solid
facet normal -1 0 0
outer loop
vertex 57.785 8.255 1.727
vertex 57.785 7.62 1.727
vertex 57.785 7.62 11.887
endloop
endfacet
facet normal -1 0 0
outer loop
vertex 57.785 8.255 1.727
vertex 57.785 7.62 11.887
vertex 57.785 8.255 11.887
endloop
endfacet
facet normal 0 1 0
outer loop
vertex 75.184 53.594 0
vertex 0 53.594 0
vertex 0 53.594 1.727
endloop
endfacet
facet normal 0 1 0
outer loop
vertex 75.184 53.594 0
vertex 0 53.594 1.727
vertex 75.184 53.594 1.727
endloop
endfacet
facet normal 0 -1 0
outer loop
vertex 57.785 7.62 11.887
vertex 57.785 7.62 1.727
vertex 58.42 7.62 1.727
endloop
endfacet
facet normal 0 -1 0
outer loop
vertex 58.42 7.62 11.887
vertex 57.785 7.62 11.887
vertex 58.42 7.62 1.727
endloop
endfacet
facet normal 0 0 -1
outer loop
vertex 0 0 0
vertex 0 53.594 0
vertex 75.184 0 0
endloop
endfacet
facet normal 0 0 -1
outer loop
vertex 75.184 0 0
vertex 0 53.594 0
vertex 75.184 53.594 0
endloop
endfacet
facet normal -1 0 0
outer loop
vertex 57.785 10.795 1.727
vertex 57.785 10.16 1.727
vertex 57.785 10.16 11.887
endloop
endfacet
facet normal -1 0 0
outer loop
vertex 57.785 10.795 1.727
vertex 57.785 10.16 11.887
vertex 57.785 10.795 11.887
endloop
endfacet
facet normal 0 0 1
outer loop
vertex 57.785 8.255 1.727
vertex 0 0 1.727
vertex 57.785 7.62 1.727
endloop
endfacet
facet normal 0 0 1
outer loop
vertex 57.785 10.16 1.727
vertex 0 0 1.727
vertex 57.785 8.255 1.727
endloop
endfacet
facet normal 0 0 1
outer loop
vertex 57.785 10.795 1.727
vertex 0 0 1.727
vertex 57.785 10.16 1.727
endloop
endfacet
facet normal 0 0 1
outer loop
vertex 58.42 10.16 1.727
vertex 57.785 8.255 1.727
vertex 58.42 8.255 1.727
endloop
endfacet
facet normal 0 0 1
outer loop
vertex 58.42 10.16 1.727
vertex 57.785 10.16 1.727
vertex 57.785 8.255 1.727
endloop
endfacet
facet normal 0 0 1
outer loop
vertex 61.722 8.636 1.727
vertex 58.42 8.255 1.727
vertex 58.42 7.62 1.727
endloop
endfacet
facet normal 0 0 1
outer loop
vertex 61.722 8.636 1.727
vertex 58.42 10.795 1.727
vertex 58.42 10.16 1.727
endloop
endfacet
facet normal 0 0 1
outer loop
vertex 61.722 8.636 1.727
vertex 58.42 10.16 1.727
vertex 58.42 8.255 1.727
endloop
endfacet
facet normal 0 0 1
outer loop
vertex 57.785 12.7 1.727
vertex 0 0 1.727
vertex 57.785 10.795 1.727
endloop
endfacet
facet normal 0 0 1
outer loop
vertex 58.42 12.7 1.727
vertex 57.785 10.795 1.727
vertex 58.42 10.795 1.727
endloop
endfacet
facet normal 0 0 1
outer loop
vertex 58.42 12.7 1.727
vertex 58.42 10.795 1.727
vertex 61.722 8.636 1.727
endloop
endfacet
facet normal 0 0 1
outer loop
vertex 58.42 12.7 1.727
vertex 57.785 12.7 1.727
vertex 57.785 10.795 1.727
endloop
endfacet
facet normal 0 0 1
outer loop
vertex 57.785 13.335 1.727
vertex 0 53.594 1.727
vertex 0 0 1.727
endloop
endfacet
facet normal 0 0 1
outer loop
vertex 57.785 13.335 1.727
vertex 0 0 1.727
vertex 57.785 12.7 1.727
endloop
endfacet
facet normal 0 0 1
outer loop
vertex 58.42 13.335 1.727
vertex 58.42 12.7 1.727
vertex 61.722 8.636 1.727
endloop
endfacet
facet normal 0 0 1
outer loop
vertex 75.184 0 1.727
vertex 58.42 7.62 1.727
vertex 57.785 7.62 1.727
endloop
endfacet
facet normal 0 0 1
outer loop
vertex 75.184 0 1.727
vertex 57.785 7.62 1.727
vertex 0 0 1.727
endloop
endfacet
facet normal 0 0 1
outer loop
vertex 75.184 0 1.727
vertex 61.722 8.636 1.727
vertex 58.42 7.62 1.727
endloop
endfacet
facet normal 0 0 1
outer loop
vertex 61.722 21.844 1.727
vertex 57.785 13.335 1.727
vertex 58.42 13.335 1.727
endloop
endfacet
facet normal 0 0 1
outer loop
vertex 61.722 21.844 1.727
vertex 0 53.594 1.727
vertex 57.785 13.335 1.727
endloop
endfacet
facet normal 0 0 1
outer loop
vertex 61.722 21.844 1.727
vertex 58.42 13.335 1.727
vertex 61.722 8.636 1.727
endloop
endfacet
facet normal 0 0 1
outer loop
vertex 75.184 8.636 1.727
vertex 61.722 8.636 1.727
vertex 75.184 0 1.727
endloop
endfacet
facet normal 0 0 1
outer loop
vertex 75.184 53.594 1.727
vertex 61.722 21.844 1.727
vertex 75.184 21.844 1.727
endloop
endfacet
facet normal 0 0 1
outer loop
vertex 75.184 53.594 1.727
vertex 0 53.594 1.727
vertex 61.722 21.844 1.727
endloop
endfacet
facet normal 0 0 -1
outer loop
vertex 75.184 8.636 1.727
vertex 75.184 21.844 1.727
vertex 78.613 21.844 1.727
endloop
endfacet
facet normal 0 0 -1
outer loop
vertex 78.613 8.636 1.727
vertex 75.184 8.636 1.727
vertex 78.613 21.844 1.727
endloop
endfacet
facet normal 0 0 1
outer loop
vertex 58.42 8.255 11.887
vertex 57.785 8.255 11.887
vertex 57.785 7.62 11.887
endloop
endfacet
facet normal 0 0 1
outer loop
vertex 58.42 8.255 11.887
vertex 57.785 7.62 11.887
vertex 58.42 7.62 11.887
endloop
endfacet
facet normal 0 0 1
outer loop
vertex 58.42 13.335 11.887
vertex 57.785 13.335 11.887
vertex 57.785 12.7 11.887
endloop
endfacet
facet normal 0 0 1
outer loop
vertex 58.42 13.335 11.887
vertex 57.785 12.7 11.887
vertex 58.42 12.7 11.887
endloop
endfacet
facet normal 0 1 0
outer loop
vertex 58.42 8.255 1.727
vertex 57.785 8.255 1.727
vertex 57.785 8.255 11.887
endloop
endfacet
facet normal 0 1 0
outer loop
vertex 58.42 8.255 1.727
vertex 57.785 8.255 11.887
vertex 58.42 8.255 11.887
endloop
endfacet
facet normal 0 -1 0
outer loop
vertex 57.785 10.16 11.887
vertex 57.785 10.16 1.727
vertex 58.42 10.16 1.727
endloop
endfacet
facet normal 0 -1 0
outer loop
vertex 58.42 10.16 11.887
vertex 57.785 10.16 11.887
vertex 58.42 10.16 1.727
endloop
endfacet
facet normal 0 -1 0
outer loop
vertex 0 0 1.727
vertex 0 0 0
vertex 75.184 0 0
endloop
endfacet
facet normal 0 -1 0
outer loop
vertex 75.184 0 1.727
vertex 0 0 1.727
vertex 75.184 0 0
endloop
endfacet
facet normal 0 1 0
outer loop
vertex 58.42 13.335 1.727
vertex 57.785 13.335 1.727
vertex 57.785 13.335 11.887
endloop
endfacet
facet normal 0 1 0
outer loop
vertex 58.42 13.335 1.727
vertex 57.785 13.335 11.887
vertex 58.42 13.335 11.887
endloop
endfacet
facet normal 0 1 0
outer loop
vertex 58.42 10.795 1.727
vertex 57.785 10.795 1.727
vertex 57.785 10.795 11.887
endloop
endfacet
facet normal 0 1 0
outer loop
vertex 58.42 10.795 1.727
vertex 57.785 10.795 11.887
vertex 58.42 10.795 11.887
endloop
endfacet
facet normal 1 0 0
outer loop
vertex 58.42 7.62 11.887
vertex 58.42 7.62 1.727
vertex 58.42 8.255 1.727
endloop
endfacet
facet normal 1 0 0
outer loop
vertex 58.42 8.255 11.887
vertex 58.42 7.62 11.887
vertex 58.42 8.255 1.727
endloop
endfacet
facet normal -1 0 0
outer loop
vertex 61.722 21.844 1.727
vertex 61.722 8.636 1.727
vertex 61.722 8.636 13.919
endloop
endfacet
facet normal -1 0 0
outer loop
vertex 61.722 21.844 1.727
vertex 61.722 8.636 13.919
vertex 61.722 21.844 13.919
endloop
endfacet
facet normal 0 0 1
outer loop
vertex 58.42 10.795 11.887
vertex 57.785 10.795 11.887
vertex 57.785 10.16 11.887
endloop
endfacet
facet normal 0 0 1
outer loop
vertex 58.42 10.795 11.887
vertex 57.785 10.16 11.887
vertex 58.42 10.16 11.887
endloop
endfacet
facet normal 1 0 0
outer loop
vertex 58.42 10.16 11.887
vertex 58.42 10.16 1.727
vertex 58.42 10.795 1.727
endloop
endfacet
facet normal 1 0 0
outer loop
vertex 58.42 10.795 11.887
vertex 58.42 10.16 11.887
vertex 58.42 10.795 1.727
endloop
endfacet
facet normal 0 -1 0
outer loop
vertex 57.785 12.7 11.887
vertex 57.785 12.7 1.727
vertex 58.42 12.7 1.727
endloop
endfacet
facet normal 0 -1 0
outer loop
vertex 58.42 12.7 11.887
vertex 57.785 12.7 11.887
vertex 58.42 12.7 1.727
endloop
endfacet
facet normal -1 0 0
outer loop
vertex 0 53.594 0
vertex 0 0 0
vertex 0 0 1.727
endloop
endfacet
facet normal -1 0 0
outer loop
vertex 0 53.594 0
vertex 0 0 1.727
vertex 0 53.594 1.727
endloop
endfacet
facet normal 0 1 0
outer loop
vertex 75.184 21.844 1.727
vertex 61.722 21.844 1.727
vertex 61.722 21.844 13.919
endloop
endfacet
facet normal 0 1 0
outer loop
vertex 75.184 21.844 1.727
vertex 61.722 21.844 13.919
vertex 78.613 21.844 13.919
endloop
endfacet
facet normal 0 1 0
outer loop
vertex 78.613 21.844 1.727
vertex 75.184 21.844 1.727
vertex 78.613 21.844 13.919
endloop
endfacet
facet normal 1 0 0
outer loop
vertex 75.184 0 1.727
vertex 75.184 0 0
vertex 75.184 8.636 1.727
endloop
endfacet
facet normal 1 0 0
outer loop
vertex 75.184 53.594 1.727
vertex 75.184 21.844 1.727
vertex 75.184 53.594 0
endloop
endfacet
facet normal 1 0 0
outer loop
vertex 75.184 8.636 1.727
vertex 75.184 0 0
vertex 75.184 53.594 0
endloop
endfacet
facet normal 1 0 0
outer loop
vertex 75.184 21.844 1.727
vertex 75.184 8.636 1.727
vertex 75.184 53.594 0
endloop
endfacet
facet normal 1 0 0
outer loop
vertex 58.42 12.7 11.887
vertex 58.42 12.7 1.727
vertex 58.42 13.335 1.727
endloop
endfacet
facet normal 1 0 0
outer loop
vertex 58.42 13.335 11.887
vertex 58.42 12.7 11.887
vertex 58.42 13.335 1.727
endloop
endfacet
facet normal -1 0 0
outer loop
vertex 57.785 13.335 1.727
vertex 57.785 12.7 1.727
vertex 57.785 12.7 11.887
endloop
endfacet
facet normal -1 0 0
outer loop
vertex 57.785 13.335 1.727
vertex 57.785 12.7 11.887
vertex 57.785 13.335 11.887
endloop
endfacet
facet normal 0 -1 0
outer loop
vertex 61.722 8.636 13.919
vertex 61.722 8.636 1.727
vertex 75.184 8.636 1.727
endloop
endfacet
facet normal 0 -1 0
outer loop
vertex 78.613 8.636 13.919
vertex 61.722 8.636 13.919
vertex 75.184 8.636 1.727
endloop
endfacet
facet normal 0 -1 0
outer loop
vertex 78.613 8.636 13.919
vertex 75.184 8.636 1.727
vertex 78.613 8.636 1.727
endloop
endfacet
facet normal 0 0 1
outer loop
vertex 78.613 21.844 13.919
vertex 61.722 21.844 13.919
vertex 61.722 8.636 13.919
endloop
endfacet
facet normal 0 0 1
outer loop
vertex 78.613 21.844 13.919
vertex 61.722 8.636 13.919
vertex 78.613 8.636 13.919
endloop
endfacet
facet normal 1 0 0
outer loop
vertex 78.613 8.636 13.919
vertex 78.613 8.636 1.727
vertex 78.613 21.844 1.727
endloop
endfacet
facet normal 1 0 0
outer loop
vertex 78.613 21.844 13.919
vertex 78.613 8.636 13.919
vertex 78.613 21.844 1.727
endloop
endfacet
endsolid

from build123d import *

# Parameters (mm, degrees)
F0_W     = 75.184
F0_H     = 53.594
F1_DEPTH = 1.7272
F2_W     = 16.891
F2_H     = 13.208
F3_DEPTH = 12.192
F4_W     = 0.635
F4_H     = 0.635
F5_DEPTH = 10.16


with BuildPart() as f1:
    # F0 (on Top) → F1 (new body)
    with BuildSketch(Plane.XY):
        with Locations((37.592, 26.797)):
            Rectangle(F0_W, F0_H)
    extrude(amount=F1_DEPTH)

    # F2 (on face) → F3 (join)
    with BuildSketch(Plane.XY.offset(1.7272)):
        with Locations((70.1675, 15.24)):
            Rectangle(F2_W, F2_H)
    extrude(amount=F3_DEPTH)

    # F4 (on face) → F5 (join)
    with BuildSketch(Plane.XY.offset(1.7272)):
        with Locations((58.1025, 7.9375)):
            Rectangle(F4_W, F4_H)
        with Locations((58.1025, 10.4775)):
            Rectangle(F4_W, F4_H)
        with Locations((58.1025, 13.0175)):
            Rectangle(F4_W, F4_H)
    extrude(amount=F5_DEPTH)


solid = f1.part
